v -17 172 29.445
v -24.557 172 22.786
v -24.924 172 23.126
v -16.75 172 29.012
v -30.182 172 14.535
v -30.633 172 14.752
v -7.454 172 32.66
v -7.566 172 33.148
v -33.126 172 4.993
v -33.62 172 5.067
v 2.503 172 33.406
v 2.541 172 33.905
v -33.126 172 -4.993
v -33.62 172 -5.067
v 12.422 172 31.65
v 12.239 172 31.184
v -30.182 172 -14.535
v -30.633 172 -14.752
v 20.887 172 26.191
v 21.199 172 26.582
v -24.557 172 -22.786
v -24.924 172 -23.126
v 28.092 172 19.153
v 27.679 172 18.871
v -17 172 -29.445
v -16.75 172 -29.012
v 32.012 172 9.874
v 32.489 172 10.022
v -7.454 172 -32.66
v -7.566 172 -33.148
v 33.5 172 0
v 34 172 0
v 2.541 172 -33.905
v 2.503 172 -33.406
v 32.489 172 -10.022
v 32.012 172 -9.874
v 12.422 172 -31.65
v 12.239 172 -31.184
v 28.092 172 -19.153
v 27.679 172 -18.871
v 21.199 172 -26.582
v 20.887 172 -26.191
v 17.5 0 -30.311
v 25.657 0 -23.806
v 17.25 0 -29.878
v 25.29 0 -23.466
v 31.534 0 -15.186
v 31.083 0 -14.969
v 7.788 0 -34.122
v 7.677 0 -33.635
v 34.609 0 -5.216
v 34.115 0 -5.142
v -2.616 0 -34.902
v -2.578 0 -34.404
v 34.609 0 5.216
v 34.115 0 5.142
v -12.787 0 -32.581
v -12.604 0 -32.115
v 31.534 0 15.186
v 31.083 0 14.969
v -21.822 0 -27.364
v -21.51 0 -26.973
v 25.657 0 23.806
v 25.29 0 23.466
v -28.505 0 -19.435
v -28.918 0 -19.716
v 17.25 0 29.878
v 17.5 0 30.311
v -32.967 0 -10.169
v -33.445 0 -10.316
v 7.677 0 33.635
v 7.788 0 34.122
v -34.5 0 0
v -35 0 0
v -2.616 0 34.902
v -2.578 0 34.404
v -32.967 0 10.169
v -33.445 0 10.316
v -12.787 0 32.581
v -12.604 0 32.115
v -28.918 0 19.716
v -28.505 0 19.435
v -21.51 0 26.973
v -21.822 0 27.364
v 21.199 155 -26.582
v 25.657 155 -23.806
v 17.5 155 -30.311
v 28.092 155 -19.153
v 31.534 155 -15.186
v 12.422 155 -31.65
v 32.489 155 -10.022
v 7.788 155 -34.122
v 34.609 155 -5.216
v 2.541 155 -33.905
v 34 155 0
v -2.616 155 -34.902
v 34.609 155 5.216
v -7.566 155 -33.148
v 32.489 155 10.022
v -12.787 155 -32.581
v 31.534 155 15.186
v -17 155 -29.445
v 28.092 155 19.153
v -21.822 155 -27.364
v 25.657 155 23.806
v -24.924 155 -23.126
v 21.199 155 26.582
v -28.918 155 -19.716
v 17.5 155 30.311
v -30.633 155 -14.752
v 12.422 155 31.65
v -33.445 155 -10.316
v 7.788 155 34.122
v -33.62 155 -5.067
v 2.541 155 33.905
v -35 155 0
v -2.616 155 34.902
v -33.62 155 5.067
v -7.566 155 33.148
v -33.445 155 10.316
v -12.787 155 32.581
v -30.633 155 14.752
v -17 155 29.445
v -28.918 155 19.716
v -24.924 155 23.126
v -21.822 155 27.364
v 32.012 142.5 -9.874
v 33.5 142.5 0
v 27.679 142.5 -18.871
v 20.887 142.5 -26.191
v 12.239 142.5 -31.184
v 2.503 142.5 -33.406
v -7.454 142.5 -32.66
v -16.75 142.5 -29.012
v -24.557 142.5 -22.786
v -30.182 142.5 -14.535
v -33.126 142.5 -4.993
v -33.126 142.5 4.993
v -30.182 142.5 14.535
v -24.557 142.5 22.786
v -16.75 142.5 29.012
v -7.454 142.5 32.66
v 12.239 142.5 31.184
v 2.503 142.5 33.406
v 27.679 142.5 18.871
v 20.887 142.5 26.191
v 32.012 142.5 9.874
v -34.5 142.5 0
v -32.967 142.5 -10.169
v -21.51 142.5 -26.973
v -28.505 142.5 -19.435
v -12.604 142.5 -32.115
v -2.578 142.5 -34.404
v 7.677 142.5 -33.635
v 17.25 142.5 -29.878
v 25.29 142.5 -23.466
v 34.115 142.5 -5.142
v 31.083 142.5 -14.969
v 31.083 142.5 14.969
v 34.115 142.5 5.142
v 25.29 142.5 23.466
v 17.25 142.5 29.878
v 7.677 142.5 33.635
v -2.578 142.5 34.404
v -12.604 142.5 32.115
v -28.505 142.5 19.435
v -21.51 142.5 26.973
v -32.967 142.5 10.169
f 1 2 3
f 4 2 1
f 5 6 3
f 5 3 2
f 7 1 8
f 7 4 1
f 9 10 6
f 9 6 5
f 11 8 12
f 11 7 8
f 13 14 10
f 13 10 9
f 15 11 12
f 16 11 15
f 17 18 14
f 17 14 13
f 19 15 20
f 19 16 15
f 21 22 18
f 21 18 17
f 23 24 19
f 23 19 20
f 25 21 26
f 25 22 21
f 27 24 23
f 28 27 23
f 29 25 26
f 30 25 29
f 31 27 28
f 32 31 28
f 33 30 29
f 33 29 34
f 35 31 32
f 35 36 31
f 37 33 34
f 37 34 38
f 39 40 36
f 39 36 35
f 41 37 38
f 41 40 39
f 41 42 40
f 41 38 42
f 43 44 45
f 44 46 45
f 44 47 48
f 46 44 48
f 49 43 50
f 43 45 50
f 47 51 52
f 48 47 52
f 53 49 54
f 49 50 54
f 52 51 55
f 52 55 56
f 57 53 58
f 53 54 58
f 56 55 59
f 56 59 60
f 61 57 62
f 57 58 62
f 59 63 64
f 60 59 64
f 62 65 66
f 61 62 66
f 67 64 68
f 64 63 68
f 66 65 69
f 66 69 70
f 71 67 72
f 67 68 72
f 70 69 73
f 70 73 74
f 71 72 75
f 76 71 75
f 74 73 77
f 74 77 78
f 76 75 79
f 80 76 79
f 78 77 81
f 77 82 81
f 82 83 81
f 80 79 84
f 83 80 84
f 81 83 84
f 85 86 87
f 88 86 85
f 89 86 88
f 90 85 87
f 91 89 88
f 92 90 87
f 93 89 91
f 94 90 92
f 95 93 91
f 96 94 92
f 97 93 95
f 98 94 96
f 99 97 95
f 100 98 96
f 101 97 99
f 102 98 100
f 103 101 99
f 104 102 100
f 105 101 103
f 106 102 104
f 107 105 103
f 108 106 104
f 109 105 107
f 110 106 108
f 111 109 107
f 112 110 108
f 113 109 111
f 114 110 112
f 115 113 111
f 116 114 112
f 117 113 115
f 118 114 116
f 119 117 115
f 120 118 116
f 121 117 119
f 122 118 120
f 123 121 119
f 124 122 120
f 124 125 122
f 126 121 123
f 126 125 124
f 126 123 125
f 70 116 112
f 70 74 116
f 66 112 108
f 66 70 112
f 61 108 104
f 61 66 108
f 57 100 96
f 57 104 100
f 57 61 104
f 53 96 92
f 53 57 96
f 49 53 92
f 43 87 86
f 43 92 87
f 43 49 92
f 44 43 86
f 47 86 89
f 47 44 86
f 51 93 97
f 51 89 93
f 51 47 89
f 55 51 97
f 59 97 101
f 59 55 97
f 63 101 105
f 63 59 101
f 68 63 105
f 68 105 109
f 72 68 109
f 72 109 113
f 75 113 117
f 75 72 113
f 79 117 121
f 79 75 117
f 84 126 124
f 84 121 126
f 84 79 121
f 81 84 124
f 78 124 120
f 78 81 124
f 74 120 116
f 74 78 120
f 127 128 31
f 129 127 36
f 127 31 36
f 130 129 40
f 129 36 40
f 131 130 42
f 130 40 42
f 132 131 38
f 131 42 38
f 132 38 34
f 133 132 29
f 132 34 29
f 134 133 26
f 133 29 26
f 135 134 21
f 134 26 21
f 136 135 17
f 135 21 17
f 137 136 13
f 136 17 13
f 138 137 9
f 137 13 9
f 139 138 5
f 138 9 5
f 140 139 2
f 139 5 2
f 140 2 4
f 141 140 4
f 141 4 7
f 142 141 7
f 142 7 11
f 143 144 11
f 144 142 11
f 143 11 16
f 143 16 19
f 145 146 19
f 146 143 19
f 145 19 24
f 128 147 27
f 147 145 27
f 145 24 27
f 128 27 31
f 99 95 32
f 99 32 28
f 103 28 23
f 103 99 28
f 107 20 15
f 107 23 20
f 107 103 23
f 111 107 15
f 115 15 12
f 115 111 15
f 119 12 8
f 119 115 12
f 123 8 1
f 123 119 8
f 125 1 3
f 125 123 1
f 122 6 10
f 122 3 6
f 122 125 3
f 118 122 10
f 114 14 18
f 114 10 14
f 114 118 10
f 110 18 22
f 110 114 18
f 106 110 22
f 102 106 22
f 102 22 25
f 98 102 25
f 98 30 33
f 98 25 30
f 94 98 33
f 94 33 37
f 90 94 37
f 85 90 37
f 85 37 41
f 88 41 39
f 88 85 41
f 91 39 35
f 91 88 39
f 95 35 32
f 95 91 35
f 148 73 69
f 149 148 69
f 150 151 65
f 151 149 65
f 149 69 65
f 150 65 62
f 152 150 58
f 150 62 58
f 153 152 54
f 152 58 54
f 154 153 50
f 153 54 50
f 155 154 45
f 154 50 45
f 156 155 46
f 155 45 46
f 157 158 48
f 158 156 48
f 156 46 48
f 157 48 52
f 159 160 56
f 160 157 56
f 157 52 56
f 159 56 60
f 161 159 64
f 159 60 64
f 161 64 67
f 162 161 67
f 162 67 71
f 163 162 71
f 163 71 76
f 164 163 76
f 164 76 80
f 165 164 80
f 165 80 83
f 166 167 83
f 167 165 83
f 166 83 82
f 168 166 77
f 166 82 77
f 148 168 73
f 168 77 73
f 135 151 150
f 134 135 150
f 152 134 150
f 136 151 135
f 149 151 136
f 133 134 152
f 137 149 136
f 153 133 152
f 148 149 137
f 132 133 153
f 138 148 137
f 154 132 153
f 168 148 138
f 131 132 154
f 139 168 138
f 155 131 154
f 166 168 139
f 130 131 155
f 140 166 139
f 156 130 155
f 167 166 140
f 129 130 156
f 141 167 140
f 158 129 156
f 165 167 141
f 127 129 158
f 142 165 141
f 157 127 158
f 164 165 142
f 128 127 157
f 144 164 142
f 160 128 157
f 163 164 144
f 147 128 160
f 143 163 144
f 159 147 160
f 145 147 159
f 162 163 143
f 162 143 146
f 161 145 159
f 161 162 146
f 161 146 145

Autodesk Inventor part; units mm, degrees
ref_plane "XZ Plane" through (0, 0, 0) normal (0, 1, 0) x (-1, 0, 0)
sketch "Sketch1" plane through (0, 0, 0) normal (0, 1, 0) x (-1, 0, 0)
  circle A0 centre (0, 0) radius 35
  circle A1 centre (0, 0) radius 34.5
  dimension "d0" = 70
  dimension "d1" = 69
extrude "Extrusion1" add sketch "Sketch1" along normal blind 155
ref_plane "Work Plane2" through (35, 0, 0) normal (1, 0, 0) x (0, 1, 0)
sketch "Sketch5" plane through (0, 155, 0) normal (0, 1, 0) x (1, 0, 0)
  circle A0 centre (0, 0) radius 34
  circle A1 centre (0, 0) radius 33.5
  dimension "d44" = 68
  dimension "d45" = 67
extrude "Extrusion3" add sketch "Sketch5" along normal blind 17
sketch "Sketch6" plane through (0, 155, 0) normal (0, -1, 0) x (1, 0, 0)
  circle A0 centre (0, 0) radius 33.5
  circle A1 centre (0, 0) radius 34.5 projected
  circle A2 centre (0, 0) radius 35
extrude "Extrusion4" add sketch "Sketch6" along normal blind 12.5 contours A1
ref_plane "Work Plane4" through (34, 0, 0) normal (1, 0, 0) x (0, 1, 0)
properties part number "Engine skin lower" material "Plastic, Opaque White"
